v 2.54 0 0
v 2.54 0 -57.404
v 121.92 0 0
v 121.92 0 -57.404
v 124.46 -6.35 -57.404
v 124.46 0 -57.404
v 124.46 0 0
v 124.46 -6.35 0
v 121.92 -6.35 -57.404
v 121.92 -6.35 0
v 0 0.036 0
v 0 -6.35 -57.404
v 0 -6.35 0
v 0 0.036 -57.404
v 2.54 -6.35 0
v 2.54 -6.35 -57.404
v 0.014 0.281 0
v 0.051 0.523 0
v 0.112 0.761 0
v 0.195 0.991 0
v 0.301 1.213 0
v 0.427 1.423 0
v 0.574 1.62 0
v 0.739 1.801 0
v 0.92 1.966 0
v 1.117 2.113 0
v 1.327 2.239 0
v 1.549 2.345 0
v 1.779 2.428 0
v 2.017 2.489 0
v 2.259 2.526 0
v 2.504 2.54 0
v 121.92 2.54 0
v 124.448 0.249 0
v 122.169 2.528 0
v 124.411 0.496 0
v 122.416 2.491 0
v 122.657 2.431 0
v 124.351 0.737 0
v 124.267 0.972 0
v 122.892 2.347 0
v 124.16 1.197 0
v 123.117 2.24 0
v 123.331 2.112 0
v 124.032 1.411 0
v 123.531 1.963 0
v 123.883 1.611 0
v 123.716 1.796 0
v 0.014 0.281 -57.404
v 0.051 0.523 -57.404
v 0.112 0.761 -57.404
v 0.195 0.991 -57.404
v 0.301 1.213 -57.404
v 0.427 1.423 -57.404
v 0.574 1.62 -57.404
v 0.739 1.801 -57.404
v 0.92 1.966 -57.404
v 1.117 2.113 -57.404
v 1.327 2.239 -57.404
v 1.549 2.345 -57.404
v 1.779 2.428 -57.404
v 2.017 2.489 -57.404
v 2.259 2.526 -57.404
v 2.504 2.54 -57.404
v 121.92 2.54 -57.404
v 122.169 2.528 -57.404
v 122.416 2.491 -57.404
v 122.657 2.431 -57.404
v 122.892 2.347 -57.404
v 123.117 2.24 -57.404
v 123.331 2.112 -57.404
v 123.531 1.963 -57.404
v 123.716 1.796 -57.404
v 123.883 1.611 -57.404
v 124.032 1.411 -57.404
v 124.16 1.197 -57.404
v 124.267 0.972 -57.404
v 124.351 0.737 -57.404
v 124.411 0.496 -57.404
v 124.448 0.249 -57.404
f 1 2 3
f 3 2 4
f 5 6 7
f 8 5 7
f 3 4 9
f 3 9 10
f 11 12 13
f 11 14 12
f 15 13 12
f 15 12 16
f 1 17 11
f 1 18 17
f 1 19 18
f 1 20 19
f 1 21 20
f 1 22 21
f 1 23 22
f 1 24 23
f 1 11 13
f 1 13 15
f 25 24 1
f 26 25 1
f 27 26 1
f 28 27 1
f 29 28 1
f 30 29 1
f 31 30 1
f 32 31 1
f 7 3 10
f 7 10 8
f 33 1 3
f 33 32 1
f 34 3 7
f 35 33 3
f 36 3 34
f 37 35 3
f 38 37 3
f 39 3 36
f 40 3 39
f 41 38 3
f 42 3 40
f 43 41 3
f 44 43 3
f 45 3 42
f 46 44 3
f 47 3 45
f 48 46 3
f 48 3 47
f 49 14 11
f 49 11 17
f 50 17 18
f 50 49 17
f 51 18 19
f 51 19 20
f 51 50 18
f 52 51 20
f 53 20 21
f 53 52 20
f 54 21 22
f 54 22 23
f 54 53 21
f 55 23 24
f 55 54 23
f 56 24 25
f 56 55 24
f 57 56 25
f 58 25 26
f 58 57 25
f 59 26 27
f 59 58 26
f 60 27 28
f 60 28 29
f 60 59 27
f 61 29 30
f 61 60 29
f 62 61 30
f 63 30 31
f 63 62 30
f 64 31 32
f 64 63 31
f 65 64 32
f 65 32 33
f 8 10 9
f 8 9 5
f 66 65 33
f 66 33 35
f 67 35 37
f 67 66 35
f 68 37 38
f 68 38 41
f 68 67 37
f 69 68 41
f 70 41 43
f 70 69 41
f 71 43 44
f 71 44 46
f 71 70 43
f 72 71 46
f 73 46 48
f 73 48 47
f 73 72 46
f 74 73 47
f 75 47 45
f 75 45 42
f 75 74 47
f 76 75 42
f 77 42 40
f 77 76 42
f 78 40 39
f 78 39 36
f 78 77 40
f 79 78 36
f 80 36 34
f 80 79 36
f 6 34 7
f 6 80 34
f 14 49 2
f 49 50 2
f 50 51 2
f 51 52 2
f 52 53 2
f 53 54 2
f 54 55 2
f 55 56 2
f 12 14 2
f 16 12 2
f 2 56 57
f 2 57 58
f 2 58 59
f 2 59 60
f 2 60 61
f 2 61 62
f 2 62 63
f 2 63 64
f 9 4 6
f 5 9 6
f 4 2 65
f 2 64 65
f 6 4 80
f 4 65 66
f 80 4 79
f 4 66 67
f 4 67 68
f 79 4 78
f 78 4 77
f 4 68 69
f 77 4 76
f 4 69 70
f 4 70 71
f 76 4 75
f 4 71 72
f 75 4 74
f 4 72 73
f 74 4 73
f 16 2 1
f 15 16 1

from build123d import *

# Parameters (mm, degrees)
SKETCH1_W               = 124.46
SKETCH1_H               = 57.404
BOSS_EXTRUDE1_DEPTH     = 2.54
CUT_EXTRUDE1_START      = -57.404
CUT_EXTRUDE1_DEPTH      = 57.404
CUT_EXTRUDE2_DEPTH      = 138.083778822
CUT_EXTRUDE2_DEPTH_BACK = 138.083778822
SKETCH5_W               = 2.54
SKETCH5_H               = 57.404
BOSS_EXTRUDE2_DEPTH     = 6.35
SKETCH7_W               = 2.54
SKETCH7_H               = 57.404
BOSS_EXTRUDE3_DEPTH     = 6.35


# Read off the part's stored shape, not the designer's step: Cut-Extrude1
with BuildPart() as part:
    # Sketch1 → Boss-Extrude1 (new body)
    with BuildSketch(Plane(origin=(0, 0, 0), x_dir=(1, 0, 0), z_dir=(0, 1, 0))):
        with Locations((62.23, 28.702)):
            Rectangle(SKETCH1_W, SKETCH1_H)
    extrude(amount=BOSS_EXTRUDE1_DEPTH)

    # Cut-Extrude1 outline → Cut-Extrude1 (cut)
    with BuildSketch(Plane.XY.offset(CUT_EXTRUDE1_START)):
        with BuildLine():
            Line((0, 2.54), (0, 0.035695157))
            ThreePointArc((0, 0.035695157), (0.738676689, 1.801323311), (2.504304843, 2.54))
            Line((2.504304843, 2.54), (0, 2.54))
        make_face()
    extrude(amount=CUT_EXTRUDE1_DEPTH, mode=Mode.SUBTRACT)

    # Sketch4 → Cut-Extrude2 (cut, two sides: drawn at the far end of the back side and taken through both)
    with BuildSketch(Plane.XY.offset(-CUT_EXTRUDE2_DEPTH_BACK)):
        with BuildLine():
            Line((-137.051831338, 2.54), (121.92, 2.54))
            ThreePointArc((121.92, 2.54), (123.716051224, 1.796051224), (124.46, 0))
            Line((124.46, 0), (124.46, -258.971831338))
            Line((124.46, -258.971831338), (490.701476151, 107.269644813))
            Line((490.701476151, 107.269644813), (229.189644813, 368.781476151))
            Line((229.189644813, 368.781476151), (-137.051831338, 2.54))
        make_face()
    extrude(amount=CUT_EXTRUDE2_DEPTH + CUT_EXTRUDE2_DEPTH_BACK, mode=Mode.SUBTRACT)

    # Sketch5 → Boss-Extrude2 (add)
    with BuildSketch(Plane.XZ):
        with Locations((1.27, -28.702)):
            Rectangle(SKETCH5_W, SKETCH5_H)
    extrude(amount=BOSS_EXTRUDE2_DEPTH)

    # Sketch7 → Boss-Extrude3 (add)
    with BuildSketch(Plane.XZ):
        with Locations((123.19, -28.702)):
            Rectangle(SKETCH7_W, SKETCH7_H)
    extrude(amount=BOSS_EXTRUDE3_DEPTH)


solid = part.part
